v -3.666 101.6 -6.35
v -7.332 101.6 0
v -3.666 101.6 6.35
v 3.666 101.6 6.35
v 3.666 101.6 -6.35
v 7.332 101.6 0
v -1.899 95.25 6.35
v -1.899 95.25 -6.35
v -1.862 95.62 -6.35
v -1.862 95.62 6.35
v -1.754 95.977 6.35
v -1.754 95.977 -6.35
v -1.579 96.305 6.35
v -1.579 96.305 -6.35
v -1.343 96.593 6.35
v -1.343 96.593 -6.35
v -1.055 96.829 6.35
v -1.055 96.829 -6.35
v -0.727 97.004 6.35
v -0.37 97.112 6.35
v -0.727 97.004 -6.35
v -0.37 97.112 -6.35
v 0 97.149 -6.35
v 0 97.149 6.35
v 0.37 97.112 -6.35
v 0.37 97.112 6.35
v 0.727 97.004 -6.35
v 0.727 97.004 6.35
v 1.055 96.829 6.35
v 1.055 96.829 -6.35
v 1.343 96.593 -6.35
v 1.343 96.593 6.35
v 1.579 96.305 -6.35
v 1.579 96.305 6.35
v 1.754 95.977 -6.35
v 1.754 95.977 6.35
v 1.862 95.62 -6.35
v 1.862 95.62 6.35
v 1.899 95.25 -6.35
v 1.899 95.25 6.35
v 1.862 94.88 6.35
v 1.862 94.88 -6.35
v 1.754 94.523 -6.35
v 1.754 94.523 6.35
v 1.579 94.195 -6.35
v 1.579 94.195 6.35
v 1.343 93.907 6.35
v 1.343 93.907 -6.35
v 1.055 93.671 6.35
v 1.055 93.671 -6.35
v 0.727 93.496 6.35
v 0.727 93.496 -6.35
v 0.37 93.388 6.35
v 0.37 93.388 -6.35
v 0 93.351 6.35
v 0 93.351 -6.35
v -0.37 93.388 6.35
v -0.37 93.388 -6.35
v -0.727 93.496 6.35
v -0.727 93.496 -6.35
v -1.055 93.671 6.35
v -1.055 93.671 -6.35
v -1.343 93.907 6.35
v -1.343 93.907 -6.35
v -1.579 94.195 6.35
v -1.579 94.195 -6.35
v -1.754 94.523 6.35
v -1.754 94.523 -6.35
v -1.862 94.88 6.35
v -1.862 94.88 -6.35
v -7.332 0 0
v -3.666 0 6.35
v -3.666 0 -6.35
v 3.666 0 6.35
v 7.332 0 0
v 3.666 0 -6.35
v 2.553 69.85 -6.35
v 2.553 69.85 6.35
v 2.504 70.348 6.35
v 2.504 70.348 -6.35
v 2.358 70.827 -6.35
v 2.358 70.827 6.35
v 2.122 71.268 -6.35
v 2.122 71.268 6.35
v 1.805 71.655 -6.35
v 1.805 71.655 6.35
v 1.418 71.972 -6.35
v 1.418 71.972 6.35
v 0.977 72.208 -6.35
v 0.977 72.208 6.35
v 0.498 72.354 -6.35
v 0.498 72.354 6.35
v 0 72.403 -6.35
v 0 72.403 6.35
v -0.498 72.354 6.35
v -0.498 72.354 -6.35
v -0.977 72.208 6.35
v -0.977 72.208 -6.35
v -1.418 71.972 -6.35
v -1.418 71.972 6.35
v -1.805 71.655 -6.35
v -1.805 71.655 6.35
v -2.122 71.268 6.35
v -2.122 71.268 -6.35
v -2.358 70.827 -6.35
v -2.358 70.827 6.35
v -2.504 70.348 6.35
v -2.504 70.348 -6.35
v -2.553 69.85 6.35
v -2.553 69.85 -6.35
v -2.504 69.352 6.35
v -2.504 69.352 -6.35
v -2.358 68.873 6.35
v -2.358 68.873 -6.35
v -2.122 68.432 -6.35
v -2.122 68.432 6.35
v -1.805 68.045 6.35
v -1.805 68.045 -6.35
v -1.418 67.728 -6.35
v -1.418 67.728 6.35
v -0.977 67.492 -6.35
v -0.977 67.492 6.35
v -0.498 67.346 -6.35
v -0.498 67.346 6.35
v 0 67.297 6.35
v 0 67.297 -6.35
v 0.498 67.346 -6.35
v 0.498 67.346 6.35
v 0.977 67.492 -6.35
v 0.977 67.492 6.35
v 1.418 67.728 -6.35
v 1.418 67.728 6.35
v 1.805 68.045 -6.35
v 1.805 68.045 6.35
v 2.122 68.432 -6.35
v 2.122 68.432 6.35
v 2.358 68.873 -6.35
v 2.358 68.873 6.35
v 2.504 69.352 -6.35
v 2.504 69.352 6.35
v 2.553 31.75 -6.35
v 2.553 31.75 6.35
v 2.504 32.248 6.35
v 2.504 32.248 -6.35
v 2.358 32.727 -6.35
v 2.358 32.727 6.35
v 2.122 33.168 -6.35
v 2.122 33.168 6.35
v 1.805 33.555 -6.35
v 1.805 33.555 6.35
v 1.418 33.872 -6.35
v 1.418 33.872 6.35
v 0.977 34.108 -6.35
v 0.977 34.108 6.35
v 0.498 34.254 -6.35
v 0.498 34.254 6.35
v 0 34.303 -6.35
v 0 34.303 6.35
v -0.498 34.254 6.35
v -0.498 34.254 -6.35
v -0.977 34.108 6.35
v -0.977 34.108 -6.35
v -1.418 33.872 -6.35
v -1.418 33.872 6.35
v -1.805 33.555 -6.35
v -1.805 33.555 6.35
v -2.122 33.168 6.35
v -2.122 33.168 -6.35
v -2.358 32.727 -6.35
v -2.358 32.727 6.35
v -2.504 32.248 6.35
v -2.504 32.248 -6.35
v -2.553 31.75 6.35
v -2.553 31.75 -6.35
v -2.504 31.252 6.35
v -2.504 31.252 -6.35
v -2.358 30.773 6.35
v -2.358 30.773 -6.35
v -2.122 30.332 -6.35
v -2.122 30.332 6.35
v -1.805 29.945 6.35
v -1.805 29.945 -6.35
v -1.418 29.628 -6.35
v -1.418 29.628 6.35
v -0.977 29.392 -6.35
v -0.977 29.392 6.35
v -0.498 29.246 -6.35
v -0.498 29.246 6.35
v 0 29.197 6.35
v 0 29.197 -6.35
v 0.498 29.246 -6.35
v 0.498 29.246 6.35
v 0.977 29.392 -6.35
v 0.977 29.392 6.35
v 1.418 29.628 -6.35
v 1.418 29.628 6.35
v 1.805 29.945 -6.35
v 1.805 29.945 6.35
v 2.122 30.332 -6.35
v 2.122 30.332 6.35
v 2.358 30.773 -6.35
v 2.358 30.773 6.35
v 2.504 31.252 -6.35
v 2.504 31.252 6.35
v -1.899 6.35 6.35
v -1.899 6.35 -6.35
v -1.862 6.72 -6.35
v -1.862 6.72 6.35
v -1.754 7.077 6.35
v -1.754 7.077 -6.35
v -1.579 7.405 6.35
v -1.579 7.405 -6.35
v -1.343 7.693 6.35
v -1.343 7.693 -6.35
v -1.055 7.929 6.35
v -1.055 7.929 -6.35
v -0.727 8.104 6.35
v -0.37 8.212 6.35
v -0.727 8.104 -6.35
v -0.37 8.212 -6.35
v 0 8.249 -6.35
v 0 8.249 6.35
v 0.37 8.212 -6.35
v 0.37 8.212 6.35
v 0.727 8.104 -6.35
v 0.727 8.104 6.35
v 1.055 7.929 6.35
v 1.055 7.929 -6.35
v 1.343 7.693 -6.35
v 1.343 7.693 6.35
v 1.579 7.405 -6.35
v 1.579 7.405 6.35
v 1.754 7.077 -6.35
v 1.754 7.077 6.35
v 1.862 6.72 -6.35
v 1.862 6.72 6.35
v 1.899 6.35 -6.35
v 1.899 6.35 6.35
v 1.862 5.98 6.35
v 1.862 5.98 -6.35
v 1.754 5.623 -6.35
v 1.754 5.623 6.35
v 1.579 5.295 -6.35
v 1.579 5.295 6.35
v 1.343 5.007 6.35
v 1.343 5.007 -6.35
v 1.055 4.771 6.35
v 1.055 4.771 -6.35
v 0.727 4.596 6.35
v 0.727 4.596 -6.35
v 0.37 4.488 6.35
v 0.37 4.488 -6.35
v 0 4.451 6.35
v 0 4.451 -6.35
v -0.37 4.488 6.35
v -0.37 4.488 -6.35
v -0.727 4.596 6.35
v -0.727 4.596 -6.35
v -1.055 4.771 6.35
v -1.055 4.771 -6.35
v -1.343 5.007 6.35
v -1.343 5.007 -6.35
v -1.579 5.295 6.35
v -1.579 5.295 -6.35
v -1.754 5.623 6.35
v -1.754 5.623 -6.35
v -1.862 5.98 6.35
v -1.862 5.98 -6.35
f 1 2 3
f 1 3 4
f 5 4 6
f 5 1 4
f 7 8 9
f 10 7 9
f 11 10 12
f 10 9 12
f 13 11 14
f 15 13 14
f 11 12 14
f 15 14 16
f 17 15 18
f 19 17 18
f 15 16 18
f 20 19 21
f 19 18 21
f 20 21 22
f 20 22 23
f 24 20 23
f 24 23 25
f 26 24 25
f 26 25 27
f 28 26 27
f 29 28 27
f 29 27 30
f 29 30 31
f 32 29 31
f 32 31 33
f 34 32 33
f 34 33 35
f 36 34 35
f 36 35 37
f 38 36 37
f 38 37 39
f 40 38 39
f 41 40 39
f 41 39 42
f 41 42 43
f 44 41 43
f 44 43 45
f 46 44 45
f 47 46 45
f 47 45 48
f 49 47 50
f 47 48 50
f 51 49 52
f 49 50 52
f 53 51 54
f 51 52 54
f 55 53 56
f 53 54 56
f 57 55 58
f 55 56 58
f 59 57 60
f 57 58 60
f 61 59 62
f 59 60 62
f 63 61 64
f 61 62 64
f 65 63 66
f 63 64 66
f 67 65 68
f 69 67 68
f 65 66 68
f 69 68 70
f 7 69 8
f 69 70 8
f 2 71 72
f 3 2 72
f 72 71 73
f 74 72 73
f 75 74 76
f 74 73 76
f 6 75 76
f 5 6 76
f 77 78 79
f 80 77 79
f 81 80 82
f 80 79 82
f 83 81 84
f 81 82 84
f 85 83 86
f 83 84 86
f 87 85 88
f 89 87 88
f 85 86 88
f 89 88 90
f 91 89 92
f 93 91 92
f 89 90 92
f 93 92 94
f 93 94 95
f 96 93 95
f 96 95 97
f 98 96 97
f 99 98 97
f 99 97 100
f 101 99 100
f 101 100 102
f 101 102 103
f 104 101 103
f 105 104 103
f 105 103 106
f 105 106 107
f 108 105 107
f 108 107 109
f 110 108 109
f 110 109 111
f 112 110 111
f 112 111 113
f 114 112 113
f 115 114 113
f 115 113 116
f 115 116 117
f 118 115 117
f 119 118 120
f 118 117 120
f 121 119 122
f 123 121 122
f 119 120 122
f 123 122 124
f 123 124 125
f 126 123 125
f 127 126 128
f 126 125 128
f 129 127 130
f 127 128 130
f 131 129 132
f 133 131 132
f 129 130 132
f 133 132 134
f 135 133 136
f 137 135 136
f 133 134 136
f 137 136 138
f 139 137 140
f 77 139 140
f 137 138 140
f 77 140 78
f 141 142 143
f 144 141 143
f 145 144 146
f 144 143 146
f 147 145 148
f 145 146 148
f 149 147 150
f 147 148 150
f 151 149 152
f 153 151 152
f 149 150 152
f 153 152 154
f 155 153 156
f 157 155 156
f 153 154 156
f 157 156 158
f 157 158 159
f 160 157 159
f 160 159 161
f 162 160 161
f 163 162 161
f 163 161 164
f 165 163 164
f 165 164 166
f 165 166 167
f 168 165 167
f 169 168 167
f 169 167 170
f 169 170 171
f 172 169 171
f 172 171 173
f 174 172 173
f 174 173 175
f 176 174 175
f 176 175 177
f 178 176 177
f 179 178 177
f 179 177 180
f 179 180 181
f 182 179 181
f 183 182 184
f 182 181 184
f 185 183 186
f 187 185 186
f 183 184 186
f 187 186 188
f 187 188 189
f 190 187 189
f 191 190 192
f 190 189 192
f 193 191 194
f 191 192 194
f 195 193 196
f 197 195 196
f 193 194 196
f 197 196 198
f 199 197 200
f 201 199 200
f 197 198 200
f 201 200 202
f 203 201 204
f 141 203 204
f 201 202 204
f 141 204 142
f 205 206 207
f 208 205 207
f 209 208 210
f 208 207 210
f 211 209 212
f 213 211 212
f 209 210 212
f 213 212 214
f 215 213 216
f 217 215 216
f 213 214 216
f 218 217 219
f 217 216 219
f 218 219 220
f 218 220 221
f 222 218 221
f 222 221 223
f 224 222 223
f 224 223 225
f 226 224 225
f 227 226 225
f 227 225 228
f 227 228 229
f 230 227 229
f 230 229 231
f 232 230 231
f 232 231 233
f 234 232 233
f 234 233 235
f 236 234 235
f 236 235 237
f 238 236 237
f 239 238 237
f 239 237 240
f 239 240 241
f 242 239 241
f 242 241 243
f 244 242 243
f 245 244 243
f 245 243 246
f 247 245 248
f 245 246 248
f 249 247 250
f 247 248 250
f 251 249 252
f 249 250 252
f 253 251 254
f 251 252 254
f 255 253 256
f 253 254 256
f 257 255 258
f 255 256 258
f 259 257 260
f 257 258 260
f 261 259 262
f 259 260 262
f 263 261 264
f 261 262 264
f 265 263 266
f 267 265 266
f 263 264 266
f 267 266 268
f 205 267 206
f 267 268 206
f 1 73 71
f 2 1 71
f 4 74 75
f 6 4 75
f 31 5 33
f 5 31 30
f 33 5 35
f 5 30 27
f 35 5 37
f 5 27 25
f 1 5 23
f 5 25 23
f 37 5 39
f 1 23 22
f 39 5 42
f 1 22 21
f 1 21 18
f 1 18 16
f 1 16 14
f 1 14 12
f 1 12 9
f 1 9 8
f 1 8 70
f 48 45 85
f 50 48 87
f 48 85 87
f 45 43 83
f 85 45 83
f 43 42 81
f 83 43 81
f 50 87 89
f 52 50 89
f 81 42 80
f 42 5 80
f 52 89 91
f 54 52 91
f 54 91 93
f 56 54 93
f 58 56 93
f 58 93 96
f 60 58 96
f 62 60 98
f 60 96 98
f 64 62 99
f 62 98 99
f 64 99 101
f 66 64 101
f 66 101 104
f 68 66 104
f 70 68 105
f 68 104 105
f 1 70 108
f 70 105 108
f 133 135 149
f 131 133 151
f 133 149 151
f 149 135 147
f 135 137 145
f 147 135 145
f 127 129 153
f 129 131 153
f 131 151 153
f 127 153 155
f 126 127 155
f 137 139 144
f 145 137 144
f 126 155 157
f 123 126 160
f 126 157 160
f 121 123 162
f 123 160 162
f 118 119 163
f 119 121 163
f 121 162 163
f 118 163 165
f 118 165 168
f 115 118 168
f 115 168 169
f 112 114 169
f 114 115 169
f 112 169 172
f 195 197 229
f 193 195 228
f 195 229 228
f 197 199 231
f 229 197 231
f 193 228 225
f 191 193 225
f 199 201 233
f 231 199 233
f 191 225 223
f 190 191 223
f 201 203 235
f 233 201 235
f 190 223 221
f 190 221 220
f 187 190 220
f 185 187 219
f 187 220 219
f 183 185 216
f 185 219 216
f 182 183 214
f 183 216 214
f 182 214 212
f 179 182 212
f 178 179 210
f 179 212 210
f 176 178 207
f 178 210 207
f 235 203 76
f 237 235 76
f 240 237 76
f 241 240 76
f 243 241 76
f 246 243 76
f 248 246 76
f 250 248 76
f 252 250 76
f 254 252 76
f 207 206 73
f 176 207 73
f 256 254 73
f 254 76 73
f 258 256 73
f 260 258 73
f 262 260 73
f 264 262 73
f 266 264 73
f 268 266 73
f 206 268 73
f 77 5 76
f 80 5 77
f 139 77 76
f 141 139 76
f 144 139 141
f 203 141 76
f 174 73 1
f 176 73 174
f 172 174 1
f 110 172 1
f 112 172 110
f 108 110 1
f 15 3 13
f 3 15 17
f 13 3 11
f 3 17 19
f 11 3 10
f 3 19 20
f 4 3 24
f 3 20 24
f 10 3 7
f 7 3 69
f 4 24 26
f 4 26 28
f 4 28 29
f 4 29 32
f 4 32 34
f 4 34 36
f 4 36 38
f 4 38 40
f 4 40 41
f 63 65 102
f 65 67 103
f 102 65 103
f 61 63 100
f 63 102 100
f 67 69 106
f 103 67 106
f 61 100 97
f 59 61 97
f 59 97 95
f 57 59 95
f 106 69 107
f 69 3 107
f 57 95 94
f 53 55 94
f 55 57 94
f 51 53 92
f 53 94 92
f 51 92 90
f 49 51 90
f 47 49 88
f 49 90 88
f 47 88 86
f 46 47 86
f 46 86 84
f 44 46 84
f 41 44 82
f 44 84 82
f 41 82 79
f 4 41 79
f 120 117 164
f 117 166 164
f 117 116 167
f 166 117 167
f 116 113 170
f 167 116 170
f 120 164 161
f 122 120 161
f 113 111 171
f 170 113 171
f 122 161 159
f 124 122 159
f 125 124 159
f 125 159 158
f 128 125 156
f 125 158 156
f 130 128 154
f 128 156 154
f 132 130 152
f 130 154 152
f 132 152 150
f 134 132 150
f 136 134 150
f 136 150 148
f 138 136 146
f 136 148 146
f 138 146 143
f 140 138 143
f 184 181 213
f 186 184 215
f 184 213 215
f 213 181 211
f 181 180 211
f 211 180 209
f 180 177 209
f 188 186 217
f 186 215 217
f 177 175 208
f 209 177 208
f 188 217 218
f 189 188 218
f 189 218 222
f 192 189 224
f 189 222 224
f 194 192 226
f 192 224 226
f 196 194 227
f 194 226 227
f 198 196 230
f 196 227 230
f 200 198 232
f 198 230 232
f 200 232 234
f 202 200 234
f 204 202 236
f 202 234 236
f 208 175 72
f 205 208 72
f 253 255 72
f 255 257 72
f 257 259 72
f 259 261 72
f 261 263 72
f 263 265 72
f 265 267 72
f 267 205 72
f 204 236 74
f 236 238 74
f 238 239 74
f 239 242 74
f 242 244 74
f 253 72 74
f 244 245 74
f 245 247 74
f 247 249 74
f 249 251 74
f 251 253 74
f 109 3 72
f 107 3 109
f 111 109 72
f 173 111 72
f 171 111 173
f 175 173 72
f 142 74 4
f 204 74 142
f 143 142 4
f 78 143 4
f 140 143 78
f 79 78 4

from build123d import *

# Parameters (mm, degrees)
BOSS_EXTRUDE1_DEPTH        = 101.6
TAP_DRILL_FOR_10_24_TAP1_D = 3.7973
SKETCH6_R                  = 2.5527
CUT_EXTRUDE1_DEPTH         = 103.652877862


with BuildPart() as part:
    # Sketch1 → Boss-Extrude1 (new body)
    with BuildSketch(Plane(origin=(0, 0, 0), x_dir=(1, 0, 0), z_dir=(0, 1, 0))):
        Polygon((7.332348419, 0), (3.666174209, 6.35), (-3.666174209, 6.35), (-7.332348419, 0), (-3.666174209, -6.35), (3.666174209, -6.35), align=None)
    extrude(amount=BOSS_EXTRUDE1_DEPTH)

    # Tap Drill for #10-24 Tap1 (through all)
    with Locations(Plane.XY.offset(6.35)):
        with Locations((0, 95.25), (0, 6.35)):
            Hole(TAP_DRILL_FOR_10_24_TAP1_D / 2)

    # Sketch6 → Cut-Extrude1 (cut, through all)
    with BuildSketch(Plane.XY.offset(6.35)):
        with Locations((0, 31.75)):
            Circle(SKETCH6_R)
        with Locations((0, 69.85)):
            Circle(SKETCH6_R)
    extrude(amount=-CUT_EXTRUDE1_DEPTH, mode=Mode.SUBTRACT)


solid = part.part
